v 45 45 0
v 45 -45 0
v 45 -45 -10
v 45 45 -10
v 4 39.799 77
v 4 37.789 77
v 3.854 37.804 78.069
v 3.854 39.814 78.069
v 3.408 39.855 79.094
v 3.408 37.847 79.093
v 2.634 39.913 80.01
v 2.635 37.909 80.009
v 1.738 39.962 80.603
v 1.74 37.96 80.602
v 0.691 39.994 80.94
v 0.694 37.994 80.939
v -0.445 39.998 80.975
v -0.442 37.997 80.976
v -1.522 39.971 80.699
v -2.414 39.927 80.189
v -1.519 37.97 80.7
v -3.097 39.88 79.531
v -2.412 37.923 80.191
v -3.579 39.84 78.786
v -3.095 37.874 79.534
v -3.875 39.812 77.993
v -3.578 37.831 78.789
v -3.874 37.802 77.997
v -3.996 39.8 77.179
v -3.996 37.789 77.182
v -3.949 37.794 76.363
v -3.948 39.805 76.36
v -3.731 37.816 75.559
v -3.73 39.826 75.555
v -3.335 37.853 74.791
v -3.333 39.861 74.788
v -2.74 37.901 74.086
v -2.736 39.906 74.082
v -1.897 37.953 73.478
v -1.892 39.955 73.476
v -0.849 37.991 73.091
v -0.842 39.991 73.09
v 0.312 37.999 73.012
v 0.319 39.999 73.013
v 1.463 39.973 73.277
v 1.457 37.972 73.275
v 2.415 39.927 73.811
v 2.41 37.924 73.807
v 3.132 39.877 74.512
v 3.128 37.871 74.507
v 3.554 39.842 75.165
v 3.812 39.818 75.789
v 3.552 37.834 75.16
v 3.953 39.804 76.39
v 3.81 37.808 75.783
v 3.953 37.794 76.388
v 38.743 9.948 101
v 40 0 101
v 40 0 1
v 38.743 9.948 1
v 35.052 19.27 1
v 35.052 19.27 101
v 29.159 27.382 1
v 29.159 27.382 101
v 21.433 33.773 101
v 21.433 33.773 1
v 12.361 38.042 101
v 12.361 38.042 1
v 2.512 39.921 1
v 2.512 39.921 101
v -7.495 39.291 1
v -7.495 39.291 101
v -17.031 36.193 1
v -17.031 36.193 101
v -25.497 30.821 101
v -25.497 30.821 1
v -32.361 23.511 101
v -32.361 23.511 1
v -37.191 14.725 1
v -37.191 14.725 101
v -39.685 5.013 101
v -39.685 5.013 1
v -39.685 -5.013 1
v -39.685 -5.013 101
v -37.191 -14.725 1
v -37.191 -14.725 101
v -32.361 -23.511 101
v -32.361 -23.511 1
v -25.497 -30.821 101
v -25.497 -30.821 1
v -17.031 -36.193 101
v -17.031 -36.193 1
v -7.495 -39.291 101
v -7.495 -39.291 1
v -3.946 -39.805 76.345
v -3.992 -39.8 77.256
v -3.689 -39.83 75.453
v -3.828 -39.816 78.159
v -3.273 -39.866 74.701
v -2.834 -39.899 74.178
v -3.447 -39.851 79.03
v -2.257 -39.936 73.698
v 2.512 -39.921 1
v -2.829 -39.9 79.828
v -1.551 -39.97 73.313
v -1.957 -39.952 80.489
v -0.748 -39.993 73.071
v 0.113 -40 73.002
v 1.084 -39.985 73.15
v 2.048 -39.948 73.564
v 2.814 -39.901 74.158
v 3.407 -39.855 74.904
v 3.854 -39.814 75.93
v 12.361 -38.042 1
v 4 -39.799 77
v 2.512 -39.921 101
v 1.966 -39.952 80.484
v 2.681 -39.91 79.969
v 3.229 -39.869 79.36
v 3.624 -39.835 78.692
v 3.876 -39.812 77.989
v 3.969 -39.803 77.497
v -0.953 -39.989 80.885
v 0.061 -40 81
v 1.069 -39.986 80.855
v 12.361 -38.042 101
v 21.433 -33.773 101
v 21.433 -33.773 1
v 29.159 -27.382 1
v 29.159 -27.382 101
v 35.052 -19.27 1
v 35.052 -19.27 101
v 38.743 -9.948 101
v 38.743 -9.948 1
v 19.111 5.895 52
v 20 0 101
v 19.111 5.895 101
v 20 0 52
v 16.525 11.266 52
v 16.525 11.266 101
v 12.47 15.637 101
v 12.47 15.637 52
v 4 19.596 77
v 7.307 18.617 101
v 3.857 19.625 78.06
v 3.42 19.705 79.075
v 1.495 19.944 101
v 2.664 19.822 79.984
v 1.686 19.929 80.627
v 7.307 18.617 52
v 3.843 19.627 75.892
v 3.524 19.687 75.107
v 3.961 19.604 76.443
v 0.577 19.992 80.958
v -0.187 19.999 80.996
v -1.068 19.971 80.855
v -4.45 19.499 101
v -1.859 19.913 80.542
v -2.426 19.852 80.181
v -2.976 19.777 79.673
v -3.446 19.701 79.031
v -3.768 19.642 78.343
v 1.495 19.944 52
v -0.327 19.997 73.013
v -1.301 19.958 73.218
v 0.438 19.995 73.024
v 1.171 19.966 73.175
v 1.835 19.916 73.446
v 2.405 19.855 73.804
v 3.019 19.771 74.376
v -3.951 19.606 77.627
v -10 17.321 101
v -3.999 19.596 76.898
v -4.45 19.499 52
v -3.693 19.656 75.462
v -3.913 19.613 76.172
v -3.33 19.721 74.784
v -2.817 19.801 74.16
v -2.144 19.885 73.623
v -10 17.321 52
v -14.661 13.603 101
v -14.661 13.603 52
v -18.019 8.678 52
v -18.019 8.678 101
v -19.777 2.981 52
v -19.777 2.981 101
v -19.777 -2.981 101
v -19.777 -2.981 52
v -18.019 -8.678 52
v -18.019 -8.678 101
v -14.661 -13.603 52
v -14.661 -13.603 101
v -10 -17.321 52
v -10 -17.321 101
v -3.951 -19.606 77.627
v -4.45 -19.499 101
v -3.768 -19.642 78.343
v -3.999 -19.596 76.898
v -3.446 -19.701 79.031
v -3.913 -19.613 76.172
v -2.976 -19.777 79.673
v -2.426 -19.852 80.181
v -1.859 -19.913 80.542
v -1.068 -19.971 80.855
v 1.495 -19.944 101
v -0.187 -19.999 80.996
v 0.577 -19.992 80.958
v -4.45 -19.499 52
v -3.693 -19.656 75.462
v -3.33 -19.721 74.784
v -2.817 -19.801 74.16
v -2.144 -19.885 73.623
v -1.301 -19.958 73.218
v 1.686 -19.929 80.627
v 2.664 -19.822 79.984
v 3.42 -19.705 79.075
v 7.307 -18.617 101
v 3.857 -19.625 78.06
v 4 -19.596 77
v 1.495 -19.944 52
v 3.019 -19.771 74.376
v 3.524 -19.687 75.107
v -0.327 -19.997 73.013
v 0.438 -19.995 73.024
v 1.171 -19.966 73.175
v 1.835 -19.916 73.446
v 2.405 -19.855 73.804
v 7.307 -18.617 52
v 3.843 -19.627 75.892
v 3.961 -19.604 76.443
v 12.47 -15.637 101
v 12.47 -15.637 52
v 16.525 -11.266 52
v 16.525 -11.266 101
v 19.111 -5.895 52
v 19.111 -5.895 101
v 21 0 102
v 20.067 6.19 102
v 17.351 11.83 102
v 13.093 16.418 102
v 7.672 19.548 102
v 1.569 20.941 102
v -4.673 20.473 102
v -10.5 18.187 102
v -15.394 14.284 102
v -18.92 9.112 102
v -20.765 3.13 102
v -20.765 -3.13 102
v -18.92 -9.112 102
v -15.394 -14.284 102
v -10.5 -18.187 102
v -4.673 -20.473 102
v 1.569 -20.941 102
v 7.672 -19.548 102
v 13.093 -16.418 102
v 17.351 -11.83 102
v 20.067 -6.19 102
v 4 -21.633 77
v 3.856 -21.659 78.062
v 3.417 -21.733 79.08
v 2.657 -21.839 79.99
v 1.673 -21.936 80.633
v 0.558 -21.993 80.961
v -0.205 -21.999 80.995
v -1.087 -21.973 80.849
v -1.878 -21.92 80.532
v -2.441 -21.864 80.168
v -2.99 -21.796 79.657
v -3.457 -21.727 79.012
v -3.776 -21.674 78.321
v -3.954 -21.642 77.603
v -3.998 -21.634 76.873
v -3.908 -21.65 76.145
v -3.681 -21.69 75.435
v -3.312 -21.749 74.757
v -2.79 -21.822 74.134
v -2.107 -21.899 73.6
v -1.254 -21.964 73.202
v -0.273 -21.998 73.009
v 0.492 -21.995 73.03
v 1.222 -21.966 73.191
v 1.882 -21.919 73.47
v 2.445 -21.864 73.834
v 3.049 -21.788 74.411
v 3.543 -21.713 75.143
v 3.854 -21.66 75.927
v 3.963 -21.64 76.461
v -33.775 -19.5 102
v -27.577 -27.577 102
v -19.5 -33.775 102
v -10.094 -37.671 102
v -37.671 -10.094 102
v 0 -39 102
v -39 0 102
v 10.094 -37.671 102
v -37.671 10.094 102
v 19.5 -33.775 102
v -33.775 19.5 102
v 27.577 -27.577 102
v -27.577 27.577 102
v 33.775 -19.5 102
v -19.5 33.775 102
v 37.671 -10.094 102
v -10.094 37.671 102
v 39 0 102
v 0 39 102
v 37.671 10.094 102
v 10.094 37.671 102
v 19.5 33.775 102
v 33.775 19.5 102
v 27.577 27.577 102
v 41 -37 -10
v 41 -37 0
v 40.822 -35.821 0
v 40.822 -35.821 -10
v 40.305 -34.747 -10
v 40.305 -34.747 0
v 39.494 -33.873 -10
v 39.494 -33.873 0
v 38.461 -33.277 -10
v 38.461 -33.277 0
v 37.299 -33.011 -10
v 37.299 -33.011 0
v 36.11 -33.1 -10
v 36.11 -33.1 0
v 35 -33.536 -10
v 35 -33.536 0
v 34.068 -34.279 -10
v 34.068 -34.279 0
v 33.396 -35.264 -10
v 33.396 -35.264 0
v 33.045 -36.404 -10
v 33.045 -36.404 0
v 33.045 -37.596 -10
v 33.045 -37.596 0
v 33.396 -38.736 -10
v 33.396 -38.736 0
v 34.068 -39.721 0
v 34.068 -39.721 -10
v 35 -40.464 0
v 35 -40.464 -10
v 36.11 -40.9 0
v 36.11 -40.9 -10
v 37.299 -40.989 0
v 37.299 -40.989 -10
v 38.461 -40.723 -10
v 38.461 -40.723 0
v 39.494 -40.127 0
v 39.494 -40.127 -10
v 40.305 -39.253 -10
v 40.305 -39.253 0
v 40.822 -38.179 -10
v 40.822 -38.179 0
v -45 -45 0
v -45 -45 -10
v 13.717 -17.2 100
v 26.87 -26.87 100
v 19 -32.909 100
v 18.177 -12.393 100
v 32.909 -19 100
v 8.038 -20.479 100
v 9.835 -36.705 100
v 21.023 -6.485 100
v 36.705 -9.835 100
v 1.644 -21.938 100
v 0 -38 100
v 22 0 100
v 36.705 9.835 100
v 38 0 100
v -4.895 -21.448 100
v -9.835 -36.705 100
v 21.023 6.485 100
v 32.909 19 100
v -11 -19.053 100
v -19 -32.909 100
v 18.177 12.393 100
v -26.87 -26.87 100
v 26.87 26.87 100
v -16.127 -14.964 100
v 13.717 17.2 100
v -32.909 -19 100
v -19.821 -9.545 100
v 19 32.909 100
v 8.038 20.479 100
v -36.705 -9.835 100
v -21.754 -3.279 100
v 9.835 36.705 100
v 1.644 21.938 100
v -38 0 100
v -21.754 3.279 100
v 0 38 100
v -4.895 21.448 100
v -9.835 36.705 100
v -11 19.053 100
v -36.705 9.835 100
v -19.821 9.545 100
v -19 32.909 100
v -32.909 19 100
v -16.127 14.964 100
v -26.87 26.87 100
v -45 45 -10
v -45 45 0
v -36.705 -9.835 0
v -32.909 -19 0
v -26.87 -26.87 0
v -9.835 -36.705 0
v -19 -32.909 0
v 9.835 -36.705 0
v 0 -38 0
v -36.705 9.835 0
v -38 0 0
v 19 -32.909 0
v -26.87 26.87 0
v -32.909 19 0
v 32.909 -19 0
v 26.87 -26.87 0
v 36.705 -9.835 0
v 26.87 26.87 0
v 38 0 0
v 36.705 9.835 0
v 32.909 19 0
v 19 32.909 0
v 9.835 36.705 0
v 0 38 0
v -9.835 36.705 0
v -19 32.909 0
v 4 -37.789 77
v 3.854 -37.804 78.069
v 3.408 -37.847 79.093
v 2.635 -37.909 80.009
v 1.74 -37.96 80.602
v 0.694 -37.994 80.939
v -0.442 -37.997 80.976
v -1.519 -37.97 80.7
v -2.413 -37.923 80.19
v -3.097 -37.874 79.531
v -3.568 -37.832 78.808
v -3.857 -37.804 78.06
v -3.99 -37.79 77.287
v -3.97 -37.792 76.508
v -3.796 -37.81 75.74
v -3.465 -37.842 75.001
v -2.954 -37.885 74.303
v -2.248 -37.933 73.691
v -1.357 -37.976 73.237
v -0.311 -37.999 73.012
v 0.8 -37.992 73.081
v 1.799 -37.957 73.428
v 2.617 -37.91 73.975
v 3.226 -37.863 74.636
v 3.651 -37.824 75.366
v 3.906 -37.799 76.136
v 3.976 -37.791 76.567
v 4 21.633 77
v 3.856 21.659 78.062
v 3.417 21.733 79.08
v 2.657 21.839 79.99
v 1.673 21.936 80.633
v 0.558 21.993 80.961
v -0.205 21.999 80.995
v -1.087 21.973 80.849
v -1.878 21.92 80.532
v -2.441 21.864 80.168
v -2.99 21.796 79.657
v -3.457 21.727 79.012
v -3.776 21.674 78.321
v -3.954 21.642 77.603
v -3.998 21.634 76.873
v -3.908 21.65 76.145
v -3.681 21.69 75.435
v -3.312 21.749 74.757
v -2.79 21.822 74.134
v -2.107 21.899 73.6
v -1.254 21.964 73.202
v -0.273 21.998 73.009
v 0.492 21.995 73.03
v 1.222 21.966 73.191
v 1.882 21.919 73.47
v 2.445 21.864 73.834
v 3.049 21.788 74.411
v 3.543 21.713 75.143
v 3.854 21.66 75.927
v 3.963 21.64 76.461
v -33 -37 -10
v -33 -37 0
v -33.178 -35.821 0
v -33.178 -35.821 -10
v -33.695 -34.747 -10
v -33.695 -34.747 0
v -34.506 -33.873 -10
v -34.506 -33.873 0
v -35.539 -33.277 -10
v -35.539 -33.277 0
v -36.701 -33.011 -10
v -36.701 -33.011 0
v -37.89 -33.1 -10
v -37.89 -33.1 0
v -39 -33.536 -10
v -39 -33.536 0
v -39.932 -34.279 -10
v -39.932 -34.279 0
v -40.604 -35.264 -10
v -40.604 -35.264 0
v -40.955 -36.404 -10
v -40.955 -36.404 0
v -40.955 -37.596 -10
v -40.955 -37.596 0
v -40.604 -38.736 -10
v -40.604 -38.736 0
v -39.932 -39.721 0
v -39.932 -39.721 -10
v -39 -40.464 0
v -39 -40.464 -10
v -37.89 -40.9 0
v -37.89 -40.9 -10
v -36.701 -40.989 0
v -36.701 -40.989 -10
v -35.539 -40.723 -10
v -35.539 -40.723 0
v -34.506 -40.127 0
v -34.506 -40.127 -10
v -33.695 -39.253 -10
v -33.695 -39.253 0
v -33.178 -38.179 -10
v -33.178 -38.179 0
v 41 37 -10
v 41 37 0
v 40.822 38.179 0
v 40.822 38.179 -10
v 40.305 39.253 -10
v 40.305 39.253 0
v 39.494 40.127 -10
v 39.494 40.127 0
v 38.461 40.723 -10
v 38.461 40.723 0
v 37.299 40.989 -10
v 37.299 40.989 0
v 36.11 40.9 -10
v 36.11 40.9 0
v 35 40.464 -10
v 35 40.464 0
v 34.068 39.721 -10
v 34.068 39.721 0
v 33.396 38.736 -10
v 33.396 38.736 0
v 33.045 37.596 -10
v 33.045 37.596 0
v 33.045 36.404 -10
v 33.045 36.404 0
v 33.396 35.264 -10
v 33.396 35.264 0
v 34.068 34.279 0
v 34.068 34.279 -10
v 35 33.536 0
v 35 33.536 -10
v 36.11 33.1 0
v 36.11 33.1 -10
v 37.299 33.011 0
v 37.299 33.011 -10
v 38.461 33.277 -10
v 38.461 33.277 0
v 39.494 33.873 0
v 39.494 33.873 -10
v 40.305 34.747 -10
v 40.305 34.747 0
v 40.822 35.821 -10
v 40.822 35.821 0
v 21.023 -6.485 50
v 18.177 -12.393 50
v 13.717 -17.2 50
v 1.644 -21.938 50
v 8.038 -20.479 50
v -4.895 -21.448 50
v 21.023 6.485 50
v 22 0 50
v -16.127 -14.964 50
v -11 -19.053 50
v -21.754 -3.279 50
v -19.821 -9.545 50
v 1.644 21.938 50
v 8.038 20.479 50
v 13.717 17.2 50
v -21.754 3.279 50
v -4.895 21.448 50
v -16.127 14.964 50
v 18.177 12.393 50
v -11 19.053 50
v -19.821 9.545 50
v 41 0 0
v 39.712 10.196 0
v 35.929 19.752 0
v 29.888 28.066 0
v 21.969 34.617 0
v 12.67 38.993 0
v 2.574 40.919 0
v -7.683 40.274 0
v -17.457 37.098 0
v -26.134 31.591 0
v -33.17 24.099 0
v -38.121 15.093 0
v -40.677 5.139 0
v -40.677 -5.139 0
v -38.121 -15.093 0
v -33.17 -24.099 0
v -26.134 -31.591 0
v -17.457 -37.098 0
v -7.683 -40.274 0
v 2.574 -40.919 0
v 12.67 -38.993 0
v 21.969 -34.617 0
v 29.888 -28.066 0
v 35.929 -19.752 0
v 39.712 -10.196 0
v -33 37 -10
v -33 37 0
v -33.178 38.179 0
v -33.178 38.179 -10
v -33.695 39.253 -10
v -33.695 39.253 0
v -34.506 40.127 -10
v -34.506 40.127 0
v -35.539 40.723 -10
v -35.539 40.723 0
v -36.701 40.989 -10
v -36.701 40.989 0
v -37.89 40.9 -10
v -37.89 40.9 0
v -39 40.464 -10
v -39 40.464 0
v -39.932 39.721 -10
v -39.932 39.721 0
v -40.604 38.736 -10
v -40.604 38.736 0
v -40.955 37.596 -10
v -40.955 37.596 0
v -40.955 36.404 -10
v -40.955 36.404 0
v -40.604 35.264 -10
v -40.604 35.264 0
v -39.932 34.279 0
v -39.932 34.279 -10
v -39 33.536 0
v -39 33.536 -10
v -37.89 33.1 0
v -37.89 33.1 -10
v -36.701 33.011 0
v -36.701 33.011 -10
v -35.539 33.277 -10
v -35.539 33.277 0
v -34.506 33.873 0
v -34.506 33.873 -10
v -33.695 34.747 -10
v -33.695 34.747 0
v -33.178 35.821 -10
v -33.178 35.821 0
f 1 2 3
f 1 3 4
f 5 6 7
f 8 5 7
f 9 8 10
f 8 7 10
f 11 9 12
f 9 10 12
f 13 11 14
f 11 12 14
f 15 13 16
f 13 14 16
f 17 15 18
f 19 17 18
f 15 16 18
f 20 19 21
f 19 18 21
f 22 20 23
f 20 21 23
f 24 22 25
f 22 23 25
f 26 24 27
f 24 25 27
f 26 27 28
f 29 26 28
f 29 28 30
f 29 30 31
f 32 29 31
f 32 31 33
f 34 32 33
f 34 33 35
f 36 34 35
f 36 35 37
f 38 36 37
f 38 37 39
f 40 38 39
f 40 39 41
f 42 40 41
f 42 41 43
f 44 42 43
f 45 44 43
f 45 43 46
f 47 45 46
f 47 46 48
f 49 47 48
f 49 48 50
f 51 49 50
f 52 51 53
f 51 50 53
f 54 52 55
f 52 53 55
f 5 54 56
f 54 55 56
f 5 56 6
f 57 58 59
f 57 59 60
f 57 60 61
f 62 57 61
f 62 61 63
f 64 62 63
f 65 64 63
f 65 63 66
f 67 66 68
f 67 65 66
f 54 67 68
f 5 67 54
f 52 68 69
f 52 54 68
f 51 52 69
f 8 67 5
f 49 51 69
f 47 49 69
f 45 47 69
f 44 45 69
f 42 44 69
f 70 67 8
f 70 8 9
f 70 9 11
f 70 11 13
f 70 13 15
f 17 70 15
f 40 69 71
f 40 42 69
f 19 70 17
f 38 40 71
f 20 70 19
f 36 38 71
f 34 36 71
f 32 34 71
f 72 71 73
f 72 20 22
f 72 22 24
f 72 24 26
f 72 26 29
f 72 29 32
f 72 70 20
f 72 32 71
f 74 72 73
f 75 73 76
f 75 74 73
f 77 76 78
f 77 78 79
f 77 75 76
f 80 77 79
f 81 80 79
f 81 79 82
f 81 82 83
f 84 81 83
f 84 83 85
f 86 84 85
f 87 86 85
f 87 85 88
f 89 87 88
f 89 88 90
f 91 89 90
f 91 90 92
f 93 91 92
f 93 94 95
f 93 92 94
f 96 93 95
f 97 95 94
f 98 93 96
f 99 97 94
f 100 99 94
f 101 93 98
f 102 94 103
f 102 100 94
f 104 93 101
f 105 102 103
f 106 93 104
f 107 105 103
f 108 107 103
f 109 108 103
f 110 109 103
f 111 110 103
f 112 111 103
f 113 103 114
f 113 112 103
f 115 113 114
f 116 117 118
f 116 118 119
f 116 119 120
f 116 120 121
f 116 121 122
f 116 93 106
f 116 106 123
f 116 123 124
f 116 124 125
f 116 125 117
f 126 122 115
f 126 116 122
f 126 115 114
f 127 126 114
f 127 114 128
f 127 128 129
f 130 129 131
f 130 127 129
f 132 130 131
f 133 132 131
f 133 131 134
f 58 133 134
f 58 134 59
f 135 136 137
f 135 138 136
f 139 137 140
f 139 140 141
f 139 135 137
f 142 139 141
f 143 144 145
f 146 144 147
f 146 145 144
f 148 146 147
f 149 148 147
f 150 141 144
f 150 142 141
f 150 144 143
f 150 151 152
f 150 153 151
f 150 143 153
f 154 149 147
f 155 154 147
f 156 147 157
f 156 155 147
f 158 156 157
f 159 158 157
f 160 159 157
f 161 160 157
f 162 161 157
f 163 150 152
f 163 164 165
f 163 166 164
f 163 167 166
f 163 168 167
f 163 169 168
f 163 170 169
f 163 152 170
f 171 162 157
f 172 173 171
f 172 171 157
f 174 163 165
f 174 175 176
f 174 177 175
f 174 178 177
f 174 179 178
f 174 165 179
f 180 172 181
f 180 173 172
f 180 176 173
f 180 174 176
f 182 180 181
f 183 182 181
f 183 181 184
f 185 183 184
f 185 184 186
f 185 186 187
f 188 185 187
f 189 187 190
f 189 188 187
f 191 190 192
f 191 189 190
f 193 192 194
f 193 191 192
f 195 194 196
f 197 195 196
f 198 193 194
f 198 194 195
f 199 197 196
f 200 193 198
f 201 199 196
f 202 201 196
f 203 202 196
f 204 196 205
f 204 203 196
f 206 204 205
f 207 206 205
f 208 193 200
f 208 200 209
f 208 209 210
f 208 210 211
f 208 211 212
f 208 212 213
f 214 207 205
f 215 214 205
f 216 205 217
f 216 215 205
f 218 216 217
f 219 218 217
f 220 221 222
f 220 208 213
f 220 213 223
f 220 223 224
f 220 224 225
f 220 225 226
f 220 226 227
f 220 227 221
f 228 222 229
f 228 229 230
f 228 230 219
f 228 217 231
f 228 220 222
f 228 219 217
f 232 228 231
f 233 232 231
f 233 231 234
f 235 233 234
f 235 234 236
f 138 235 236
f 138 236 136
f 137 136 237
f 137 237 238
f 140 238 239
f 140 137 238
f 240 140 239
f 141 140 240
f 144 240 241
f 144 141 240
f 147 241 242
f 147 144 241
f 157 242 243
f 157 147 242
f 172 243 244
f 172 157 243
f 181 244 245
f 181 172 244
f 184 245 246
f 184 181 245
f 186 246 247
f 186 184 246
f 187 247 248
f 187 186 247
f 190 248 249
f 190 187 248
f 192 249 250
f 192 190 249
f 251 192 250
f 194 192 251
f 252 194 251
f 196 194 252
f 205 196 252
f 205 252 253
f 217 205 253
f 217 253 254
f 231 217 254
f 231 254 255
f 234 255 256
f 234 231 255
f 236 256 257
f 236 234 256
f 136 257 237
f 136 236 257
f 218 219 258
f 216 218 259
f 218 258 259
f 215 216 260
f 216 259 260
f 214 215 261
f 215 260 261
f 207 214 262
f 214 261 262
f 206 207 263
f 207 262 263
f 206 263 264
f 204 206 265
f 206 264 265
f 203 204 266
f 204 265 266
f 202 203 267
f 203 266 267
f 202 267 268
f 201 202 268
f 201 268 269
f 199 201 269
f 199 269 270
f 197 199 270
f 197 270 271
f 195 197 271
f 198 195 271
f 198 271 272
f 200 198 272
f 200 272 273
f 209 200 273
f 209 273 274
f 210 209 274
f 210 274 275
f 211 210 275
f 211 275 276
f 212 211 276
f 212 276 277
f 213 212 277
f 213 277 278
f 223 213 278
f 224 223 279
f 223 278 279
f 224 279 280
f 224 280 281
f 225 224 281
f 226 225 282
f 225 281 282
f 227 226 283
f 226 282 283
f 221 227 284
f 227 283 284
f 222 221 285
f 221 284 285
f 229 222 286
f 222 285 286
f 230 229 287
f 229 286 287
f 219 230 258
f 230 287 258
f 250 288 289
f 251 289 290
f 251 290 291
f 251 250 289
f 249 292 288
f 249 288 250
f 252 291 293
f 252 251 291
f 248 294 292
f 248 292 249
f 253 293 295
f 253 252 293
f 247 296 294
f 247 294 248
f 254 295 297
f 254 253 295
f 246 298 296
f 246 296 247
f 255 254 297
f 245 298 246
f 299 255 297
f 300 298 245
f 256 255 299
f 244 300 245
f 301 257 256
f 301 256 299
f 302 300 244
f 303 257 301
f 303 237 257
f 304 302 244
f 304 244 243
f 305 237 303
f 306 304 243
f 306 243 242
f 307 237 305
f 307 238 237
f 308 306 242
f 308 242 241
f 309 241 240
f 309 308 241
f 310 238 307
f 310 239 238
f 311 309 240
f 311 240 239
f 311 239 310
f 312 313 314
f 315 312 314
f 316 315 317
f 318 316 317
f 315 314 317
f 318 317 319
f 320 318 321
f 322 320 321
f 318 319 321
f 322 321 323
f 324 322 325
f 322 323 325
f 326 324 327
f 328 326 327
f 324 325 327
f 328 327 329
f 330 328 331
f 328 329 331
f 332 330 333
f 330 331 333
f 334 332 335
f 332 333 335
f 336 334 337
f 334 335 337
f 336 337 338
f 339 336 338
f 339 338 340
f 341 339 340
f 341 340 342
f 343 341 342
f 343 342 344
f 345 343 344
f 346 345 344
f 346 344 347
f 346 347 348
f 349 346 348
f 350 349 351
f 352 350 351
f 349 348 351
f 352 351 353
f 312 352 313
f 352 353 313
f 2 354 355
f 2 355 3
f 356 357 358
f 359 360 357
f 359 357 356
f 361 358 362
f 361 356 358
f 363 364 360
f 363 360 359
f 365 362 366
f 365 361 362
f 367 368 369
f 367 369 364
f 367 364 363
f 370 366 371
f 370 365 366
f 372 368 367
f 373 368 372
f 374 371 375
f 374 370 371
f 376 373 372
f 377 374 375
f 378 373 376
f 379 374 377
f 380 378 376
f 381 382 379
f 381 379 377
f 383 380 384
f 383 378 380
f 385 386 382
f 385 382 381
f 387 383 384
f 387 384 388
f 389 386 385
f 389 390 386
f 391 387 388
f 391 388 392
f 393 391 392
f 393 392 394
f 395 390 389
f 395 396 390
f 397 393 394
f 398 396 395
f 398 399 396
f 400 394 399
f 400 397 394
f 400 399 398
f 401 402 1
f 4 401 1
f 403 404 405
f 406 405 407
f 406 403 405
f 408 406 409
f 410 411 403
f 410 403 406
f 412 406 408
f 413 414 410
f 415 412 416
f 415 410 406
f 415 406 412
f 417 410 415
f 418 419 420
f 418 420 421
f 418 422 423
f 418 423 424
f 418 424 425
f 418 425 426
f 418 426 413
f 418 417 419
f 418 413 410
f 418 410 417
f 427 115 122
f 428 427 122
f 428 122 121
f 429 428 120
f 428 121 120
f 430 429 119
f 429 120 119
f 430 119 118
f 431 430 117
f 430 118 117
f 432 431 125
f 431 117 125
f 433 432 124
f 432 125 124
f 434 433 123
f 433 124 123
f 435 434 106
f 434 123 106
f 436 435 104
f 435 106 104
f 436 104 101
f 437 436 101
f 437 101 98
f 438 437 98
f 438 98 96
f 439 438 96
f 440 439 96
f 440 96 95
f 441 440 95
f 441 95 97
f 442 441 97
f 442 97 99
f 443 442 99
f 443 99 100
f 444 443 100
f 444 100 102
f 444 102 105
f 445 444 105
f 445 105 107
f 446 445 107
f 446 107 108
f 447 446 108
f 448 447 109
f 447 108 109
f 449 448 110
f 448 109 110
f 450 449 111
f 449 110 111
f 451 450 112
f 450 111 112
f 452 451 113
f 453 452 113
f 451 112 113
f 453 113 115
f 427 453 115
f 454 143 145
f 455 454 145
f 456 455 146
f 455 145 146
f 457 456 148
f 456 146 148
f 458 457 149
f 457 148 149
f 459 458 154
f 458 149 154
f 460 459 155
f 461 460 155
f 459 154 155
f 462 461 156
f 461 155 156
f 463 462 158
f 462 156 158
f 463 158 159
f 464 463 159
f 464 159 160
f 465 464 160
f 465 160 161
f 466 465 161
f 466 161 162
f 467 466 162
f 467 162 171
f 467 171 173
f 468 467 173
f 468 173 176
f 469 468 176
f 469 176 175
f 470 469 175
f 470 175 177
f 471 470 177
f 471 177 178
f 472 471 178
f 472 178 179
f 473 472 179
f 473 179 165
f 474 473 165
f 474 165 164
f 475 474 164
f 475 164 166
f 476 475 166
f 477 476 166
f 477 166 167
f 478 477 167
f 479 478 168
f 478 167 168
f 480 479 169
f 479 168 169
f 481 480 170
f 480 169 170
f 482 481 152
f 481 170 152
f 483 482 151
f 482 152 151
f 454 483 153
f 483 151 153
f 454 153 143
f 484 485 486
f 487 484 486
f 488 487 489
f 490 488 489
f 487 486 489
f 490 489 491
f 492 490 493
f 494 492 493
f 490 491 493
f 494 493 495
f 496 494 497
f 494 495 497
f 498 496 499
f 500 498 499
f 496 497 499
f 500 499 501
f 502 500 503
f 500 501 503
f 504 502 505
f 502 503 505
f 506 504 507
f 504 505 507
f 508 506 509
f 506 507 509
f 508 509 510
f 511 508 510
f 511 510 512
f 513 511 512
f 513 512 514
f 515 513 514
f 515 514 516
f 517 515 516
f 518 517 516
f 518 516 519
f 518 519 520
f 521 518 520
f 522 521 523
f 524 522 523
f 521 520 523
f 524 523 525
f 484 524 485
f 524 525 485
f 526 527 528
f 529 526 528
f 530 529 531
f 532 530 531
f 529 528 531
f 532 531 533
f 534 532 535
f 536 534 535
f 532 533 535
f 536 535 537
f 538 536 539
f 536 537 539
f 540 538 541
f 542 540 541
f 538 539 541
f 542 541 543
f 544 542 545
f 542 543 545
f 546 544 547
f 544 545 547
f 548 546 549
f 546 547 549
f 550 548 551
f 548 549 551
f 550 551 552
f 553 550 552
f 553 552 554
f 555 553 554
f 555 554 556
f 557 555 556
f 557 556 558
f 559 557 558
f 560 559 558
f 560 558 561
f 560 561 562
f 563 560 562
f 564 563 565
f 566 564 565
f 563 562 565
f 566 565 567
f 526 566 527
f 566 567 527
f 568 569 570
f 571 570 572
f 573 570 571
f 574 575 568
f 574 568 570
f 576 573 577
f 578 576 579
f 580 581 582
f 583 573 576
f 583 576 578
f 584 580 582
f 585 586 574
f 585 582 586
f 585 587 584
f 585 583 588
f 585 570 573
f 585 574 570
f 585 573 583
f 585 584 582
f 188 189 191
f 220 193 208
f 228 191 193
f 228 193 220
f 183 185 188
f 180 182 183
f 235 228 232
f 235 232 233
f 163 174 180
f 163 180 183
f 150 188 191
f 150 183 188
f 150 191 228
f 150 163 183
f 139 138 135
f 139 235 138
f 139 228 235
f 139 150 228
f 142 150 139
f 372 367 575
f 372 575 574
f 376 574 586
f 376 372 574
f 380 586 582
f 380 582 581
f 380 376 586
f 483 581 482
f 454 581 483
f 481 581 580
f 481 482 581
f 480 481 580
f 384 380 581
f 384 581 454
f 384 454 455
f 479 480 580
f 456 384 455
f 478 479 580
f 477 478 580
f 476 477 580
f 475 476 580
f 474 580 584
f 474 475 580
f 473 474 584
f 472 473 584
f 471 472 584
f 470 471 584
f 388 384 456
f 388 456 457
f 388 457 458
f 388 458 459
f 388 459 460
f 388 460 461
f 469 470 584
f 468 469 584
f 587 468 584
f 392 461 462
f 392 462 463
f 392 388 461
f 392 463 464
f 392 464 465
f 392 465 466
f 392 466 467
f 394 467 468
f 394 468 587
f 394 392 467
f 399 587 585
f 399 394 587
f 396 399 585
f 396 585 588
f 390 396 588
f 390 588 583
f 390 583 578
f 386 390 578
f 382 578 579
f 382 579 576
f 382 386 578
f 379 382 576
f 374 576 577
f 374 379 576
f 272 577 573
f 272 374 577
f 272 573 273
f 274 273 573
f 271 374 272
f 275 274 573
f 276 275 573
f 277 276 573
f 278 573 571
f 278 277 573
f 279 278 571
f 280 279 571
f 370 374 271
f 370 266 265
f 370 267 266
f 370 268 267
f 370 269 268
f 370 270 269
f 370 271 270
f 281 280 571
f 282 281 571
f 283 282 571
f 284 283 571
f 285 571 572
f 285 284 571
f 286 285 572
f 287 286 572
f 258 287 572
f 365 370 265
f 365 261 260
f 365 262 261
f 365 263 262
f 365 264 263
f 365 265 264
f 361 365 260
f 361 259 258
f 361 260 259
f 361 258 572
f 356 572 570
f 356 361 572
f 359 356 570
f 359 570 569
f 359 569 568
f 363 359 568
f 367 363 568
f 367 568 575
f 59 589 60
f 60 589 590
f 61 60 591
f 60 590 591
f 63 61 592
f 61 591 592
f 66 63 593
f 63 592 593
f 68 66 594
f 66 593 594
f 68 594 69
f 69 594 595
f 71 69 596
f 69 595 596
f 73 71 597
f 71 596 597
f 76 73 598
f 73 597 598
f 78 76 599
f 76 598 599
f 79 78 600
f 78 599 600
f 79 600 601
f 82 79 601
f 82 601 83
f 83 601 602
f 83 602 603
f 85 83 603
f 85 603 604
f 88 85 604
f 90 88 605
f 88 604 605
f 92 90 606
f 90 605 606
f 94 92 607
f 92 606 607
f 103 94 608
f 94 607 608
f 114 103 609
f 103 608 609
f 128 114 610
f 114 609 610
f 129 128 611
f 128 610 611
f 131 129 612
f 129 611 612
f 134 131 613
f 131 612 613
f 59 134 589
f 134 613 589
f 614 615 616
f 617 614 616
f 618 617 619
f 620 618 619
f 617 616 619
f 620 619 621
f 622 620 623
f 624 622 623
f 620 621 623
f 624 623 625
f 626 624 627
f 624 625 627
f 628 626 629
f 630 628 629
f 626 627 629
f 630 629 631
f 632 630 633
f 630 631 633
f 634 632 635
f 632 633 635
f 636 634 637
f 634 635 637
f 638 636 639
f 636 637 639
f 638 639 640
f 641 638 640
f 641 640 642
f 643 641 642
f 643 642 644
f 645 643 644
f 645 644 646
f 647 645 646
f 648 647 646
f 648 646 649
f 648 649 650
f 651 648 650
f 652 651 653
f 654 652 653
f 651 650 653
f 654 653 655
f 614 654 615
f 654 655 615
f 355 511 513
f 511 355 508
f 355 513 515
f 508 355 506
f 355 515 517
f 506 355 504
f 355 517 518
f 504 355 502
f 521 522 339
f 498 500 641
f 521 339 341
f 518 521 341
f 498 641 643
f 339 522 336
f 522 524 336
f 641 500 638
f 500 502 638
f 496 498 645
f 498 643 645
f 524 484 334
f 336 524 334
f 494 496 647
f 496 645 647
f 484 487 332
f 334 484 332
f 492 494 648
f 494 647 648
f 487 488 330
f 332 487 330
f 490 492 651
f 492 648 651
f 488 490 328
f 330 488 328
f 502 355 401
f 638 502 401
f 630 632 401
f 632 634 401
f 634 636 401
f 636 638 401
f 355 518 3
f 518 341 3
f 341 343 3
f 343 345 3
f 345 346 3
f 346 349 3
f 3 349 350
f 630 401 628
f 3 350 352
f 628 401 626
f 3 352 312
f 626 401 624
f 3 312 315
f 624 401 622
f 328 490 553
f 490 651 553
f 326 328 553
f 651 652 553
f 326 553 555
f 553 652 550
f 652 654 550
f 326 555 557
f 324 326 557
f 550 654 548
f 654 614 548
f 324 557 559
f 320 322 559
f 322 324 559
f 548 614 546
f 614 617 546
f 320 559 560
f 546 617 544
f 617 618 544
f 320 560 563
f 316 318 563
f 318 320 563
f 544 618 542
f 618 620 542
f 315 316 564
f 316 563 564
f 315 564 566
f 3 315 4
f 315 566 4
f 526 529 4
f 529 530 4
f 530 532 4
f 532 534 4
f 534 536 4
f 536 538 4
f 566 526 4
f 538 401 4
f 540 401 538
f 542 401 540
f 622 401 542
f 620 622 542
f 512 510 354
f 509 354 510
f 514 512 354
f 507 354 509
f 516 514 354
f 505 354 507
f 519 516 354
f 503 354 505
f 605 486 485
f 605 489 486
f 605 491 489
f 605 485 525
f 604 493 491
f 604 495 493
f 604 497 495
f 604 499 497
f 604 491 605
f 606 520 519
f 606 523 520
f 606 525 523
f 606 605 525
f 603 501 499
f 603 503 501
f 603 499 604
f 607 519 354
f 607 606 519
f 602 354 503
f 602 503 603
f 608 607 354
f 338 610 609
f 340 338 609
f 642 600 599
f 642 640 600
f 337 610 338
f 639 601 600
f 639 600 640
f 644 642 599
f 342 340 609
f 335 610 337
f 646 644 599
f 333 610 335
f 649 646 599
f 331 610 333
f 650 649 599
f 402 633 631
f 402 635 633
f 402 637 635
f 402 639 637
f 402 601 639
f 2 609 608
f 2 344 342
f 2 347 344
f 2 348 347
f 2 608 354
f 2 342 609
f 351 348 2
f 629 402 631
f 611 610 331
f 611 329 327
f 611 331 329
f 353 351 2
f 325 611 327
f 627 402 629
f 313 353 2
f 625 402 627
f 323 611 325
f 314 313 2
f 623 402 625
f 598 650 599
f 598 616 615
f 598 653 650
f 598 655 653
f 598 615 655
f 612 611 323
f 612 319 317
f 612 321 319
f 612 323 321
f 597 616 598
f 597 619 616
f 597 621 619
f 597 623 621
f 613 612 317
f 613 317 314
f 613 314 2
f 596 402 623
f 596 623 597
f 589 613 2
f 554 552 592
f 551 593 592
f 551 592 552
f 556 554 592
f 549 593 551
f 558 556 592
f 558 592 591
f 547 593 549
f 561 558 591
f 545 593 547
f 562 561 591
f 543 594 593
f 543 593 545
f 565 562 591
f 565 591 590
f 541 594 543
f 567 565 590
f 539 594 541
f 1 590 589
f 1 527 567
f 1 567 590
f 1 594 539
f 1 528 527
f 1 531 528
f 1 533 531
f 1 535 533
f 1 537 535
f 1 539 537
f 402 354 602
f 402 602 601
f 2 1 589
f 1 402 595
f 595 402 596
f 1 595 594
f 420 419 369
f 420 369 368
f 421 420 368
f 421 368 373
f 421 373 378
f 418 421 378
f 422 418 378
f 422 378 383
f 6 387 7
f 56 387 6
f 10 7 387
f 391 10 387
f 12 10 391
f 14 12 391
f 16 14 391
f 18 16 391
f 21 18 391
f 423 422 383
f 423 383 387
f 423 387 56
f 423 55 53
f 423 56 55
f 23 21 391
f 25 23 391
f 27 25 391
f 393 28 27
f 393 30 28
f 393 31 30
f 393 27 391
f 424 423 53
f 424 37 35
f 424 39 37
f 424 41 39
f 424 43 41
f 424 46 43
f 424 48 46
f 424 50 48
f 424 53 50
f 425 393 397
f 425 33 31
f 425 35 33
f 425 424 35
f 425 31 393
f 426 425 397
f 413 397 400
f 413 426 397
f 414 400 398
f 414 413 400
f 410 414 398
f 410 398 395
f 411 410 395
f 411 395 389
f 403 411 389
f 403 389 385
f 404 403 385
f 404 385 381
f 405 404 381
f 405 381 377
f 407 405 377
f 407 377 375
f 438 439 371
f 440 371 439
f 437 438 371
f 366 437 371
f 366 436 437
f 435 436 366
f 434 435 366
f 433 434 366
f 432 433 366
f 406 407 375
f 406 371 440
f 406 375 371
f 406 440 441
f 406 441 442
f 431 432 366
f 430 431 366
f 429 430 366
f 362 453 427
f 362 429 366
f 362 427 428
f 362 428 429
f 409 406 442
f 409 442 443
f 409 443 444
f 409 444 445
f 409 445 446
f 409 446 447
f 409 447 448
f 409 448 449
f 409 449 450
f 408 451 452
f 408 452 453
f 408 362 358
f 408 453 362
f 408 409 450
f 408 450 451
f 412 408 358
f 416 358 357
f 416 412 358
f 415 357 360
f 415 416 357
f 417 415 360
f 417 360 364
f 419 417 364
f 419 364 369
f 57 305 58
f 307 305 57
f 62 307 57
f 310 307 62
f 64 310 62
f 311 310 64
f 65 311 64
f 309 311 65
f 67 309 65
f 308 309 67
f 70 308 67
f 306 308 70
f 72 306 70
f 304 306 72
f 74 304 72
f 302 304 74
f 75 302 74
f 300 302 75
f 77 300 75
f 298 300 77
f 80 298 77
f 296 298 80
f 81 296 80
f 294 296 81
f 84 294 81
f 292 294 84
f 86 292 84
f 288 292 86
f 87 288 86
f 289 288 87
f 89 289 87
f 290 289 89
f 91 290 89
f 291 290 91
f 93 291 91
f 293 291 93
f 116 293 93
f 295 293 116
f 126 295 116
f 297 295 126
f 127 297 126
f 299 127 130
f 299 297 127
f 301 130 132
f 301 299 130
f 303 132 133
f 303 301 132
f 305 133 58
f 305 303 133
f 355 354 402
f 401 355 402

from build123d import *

# Parameters (mm, degrees)
F0_W      = 90
F0_H      = 90
F0_R      = 4
F1_DEPTH  = 10
F2_R      = 40
F2_R_2    = 38
F3_DEPTH  = 100
F7_SIZE   = 1
F8_SIZE   = 1
F10_R     = 4
F11_DEPTH = 80


with BuildPart() as f1:
    # F0 (on Top) → F1 (new body)
    with BuildSketch(Plane.XY):
        Rectangle(F0_W, F0_H)
        with Locations((-37, -37)):
            Circle(F0_R, mode=Mode.SUBTRACT)
        with Locations((37, -37)):
            Circle(F0_R, mode=Mode.SUBTRACT)
        with Locations((-37, 37)):
            Circle(F0_R, mode=Mode.SUBTRACT)
        with Locations((37, 37)):
            Circle(F0_R, mode=Mode.SUBTRACT)
    extrude(amount=-F1_DEPTH)

    # F2 (on face) → F3 (join)
    with BuildSketch(Plane.XY):
        Circle(F2_R)
        Circle(F2_R_2, mode=Mode.SUBTRACT)
    extrude(amount=F3_DEPTH)

    # F5 (on Front) → F6 (revolve)
    with BuildSketch(Plane.XZ):
        Polygon((0, 52), (0, 50), (22, 50), (22, 100), (40, 100), (40, 102), (20, 102), (20, 52), align=None)
    revolve(axis=Axis((0, 0, 75.148744), (0, 0, 1)))

    # F7
    f7_edges = [f1.edges().sort_by_distance(p)[0] for p in [
        (-40, 0, 0),
        (40, 0, 51),
        (-40, 0, 102),
    ]]
    chamfer(f7_edges, length=F7_SIZE)

    # F8
    f8_edges = [f1.edges().sort_by_distance(p)[0] for p in [
        (-20, 0, 102),
    ]]
    chamfer(f8_edges, length=F8_SIZE)

    # F10 (on offset) → F11 (cut)
    with BuildSketch(Plane.XZ.offset(40)):
        with Locations((0, 77)):
            Circle(F10_R)
    extrude(amount=-F11_DEPTH, mode=Mode.SUBTRACT)


solid = f1.part
